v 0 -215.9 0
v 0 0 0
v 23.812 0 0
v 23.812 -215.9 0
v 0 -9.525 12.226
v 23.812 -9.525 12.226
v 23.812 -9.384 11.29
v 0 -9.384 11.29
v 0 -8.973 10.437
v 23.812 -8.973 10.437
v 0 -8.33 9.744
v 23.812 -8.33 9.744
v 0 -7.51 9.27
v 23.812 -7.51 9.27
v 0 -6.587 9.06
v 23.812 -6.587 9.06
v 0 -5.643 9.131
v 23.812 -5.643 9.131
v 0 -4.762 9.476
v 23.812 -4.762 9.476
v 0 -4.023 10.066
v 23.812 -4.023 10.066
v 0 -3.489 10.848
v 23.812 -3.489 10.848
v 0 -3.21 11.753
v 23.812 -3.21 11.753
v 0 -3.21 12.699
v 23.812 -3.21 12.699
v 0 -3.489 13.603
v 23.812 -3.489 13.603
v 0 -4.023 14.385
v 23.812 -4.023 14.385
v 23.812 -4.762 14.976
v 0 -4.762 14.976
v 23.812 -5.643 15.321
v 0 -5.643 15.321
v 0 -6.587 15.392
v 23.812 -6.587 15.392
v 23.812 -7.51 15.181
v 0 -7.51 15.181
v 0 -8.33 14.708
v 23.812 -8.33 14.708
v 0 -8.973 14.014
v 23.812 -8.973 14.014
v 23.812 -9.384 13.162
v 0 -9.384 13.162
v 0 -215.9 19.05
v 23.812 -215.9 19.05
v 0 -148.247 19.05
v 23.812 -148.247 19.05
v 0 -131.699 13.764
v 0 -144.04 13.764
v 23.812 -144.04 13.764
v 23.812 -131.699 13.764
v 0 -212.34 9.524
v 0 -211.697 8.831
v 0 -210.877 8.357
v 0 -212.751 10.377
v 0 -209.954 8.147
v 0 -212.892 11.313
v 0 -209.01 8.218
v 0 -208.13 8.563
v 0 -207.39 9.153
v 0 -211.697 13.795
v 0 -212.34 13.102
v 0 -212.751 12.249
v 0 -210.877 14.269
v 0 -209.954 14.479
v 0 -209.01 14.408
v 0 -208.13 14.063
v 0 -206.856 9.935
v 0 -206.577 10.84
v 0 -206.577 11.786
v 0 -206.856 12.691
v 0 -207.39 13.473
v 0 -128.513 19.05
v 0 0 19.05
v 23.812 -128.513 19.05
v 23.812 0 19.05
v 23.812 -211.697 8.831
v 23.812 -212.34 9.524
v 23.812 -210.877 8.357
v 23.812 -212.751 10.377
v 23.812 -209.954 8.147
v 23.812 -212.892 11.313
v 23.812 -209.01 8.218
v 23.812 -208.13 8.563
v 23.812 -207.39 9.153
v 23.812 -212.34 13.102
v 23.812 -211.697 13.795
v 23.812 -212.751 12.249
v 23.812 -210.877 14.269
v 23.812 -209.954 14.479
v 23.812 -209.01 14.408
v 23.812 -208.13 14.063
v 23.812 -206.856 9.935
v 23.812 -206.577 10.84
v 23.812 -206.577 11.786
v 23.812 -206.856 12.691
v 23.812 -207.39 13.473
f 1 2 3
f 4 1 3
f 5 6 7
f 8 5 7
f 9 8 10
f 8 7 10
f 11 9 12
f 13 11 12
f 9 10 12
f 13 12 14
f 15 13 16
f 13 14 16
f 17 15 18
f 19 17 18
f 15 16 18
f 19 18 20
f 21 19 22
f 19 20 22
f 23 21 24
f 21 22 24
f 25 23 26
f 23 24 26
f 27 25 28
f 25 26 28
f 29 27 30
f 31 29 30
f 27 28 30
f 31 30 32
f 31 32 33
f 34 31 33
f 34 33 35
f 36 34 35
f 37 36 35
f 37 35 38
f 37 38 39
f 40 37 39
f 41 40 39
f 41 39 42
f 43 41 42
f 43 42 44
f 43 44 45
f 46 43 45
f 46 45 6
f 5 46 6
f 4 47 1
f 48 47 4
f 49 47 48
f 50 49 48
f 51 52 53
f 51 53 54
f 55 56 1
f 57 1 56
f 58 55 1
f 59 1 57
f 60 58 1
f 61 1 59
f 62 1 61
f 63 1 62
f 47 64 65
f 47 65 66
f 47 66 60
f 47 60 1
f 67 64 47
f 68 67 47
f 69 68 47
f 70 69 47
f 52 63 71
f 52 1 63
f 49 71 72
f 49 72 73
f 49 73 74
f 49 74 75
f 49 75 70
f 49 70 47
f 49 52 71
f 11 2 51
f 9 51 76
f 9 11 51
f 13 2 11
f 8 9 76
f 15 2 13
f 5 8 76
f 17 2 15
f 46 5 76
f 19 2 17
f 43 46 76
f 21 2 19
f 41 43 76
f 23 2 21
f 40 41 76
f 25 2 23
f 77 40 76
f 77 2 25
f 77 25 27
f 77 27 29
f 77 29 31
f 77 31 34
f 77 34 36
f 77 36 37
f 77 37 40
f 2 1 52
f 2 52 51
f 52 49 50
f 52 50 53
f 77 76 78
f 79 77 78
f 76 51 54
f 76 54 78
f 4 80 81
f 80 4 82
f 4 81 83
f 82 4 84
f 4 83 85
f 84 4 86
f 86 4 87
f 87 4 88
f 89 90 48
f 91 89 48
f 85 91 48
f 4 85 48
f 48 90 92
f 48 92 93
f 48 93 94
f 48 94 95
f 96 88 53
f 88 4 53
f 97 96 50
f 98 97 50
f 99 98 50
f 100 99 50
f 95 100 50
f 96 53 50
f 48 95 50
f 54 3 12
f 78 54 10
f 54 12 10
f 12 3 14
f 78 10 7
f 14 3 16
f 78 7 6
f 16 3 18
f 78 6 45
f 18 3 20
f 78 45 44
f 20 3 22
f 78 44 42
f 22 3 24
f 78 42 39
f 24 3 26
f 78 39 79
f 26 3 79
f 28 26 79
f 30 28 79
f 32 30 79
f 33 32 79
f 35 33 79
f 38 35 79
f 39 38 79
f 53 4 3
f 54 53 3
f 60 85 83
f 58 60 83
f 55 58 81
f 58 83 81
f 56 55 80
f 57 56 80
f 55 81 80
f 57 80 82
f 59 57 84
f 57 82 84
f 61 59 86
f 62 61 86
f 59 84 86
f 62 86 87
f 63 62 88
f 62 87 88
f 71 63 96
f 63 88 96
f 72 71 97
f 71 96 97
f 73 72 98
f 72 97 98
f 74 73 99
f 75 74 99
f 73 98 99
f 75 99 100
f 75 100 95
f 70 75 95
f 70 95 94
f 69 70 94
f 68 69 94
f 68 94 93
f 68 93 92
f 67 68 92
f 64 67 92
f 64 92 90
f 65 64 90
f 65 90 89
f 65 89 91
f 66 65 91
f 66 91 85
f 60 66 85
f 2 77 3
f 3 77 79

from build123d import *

# Parameters (mm, degrees)
F0_W     = 23.8125
F0_H     = 19.05
F1_DEPTH = 215.9
F3_DEPTH = 25.4
F5_D     = 6.35
F5_DEPTH = 50.8
F5_TIP   = 1.9077324654
F7_D     = 6.35
F7_DEPTH = 50.8
F7_TIP   = 1.9077324654


with BuildPart() as f1:
    # F0 (on Front) → F1 (new body)
    with BuildSketch(Plane.XZ):
        with Locations((11.90625, 9.525)):
            Rectangle(F0_W, F0_H)
    extrude(amount=F1_DEPTH)

    # F2 (on Right) → F3 (cut)
    with BuildSketch(Plane.YZ):
        Polygon((-125.693321228, 23.7295310944), (-152.0250290632, 23.7955264747), (-144.0397202969, 13.7644028291), (-131.6988021135, 13.7644028291), align=None)
        Polygon((-130.116969347, 34.1722927988), (-152.0250290632, 23.7955264747), (-125.693321228, 23.7295310944), align=None)
    extrude(amount=F3_DEPTH, mode=Mode.SUBTRACT)

    # F5
    with Locations(Plane(origin=(0, 0, 0), x_dir=(0, 1, 0), z_dir=(-1, 0, 0))):
        with Locations((-6.35, -12.2258998454)):
            Hole(F5_D / 2, depth=F5_DEPTH)
            with Locations((0, 0, -(F5_DEPTH + F5_TIP / 2))):  # 118° drill point
                Cone(0, F5_D / 2, F5_TIP, mode=Mode.SUBTRACT)

    # F7
    with Locations(Plane(origin=(0, 0, 0), x_dir=(0, 1, 0), z_dir=(-1, 0, 0))):
        with Locations((-209.7170012236, -11.3129783422)):
            Hole(F7_D / 2, depth=F7_DEPTH)
            with Locations((0, 0, -(F7_DEPTH + F7_TIP / 2))):  # 118° drill point
                Cone(0, F7_D / 2, F7_TIP, mode=Mode.SUBTRACT)


solid = f1.part
